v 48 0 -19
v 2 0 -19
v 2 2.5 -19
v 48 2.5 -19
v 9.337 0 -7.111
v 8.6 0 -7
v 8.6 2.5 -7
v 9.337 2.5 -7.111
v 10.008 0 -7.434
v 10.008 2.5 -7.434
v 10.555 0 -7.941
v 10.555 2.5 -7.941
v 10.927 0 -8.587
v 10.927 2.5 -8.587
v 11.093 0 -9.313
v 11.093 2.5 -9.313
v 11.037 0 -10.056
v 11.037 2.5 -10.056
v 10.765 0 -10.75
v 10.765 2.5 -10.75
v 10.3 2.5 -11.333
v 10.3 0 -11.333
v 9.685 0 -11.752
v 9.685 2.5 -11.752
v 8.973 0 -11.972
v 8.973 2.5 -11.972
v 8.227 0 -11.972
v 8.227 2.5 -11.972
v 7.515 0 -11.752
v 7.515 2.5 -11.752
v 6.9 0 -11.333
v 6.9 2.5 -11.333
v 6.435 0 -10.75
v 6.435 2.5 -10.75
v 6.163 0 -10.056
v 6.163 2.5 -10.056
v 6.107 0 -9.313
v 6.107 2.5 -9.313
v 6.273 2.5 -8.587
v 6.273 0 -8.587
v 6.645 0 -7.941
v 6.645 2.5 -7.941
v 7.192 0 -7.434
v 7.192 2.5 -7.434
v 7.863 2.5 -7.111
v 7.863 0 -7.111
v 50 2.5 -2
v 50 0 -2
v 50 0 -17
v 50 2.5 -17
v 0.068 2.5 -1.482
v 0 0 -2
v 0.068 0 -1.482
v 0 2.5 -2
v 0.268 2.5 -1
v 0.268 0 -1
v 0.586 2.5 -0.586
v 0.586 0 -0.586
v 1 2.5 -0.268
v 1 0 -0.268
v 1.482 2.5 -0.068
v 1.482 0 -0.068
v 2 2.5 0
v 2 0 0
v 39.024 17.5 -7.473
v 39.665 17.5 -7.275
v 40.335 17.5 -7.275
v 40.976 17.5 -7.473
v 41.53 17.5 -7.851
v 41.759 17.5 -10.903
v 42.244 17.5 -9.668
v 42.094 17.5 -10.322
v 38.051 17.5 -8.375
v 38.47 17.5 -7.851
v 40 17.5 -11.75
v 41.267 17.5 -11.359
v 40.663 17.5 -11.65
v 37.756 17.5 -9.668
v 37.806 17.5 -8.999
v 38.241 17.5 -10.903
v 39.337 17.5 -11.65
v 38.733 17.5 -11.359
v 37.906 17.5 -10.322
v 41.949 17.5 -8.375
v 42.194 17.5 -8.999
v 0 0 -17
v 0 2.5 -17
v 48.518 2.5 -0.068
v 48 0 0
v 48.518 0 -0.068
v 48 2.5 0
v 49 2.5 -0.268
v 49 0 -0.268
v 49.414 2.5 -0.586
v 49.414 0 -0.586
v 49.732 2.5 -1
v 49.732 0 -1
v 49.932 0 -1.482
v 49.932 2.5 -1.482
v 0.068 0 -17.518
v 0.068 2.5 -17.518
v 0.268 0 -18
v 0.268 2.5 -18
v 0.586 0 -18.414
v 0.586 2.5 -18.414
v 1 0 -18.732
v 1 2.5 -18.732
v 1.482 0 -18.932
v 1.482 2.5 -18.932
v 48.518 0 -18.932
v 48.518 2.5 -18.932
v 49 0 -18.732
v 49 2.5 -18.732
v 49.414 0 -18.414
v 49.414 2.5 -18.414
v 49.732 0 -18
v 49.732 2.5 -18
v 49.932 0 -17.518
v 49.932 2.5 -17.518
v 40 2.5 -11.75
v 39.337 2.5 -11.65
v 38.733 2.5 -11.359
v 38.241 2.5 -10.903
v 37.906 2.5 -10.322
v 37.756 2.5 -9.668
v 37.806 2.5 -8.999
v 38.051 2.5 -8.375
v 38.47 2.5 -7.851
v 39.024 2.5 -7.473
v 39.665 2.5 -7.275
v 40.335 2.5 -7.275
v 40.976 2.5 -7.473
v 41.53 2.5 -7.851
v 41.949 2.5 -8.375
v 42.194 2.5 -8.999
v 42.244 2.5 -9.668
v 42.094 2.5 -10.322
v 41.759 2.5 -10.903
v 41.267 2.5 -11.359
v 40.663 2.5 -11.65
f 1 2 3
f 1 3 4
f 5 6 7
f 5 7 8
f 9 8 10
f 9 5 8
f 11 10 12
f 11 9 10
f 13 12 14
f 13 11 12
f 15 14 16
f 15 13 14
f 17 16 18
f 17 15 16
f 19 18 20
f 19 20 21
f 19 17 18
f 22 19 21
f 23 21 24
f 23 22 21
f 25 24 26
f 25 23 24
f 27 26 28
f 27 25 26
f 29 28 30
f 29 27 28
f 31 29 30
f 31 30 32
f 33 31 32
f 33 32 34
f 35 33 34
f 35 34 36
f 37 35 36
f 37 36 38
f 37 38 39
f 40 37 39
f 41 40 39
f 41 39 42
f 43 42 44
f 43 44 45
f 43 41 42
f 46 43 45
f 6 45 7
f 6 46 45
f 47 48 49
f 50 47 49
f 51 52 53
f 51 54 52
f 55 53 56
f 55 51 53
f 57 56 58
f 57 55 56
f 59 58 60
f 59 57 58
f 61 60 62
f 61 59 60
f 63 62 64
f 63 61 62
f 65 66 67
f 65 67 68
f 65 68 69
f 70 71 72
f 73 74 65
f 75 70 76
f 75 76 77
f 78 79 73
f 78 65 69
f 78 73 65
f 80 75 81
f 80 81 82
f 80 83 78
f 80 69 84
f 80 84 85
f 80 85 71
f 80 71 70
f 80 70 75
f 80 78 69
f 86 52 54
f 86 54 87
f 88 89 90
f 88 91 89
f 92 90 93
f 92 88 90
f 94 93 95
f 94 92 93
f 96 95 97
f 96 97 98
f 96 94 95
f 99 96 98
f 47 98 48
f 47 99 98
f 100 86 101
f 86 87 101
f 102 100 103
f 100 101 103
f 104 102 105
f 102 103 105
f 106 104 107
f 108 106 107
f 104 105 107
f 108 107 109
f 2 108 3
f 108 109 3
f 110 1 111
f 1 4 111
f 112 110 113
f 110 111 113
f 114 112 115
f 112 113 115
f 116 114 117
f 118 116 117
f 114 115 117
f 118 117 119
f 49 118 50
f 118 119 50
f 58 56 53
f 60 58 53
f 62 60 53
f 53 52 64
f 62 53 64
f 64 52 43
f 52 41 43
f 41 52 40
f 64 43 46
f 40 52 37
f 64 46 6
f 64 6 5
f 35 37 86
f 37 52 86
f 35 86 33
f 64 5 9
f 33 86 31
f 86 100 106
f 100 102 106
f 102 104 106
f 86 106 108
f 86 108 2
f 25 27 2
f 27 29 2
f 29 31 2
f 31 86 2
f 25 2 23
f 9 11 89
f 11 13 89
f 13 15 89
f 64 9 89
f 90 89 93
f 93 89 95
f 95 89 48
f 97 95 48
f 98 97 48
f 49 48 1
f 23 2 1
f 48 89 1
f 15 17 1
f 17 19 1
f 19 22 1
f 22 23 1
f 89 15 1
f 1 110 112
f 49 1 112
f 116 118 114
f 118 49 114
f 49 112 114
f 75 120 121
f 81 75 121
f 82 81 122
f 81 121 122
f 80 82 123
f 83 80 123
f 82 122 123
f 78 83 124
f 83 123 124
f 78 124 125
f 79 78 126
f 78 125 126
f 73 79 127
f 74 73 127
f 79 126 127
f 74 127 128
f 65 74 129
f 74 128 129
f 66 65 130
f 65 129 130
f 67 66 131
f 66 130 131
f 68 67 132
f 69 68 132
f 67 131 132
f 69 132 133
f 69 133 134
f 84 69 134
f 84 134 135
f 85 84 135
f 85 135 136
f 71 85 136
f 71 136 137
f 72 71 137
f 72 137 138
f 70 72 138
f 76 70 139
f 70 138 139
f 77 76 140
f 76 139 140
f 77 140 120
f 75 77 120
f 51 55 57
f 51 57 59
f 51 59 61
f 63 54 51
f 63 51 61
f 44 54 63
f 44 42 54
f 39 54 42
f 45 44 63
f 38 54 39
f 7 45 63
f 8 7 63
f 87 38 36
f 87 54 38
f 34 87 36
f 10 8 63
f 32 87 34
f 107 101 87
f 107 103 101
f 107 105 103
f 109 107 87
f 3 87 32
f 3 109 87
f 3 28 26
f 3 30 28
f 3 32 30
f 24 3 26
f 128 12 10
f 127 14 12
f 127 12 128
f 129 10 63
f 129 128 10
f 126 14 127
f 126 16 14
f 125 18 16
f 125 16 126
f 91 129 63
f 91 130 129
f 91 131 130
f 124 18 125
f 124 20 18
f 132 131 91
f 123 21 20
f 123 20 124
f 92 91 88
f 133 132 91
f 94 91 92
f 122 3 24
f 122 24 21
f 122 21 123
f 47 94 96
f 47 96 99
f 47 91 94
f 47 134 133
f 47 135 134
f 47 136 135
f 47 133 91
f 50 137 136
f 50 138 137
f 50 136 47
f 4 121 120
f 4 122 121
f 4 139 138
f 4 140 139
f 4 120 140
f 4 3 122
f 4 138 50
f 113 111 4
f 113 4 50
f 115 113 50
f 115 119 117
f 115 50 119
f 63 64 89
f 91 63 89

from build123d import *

# Parameters (mm, degrees)
SKETCH1_W        = 50
SKETCH1_H        = 19
SKETCH1_R        = 2.5
BASE_PLATE_DEPTH = 2.5
SKETCH2_R        = 2.25
AXIS_DEPTH       = 15
FILLET1_R        = 2


with BuildPart() as part:
    # Sketch1 → Base Plate (new body)
    with BuildSketch(Plane(origin=(0, 0, 0), x_dir=(1, 0, 0), z_dir=(0, 1, 0))):
        with Locations((25, 9.5)):
            Rectangle(SKETCH1_W, SKETCH1_H)
        with Locations(Location((8.6, 9.5, 0), (0, 0, 270))):
            Circle(SKETCH1_R, mode=Mode.SUBTRACT)
    extrude(amount=BASE_PLATE_DEPTH)

    # Sketch2 → Axis (add)
    with BuildSketch(Plane(origin=(0, 2.5, 0), x_dir=(1, 0, 0), z_dir=(0, 1, 0))):
        with Locations(Location((40, 9.5, 0), (0, 0, 90))):
            Circle(SKETCH2_R)
    extrude(amount=AXIS_DEPTH)

    # Fillet1
    fillet1_edges = [part.edges().sort_by_distance(p)[0] for p in [
        (0, 1.25, -19),
        (50, 1.25, -19),
        (50, 1.25, 0),
        (0, 1.25, 0),
    ]]
    fillet(fillet1_edges, radius=FILLET1_R)


solid = part.part
